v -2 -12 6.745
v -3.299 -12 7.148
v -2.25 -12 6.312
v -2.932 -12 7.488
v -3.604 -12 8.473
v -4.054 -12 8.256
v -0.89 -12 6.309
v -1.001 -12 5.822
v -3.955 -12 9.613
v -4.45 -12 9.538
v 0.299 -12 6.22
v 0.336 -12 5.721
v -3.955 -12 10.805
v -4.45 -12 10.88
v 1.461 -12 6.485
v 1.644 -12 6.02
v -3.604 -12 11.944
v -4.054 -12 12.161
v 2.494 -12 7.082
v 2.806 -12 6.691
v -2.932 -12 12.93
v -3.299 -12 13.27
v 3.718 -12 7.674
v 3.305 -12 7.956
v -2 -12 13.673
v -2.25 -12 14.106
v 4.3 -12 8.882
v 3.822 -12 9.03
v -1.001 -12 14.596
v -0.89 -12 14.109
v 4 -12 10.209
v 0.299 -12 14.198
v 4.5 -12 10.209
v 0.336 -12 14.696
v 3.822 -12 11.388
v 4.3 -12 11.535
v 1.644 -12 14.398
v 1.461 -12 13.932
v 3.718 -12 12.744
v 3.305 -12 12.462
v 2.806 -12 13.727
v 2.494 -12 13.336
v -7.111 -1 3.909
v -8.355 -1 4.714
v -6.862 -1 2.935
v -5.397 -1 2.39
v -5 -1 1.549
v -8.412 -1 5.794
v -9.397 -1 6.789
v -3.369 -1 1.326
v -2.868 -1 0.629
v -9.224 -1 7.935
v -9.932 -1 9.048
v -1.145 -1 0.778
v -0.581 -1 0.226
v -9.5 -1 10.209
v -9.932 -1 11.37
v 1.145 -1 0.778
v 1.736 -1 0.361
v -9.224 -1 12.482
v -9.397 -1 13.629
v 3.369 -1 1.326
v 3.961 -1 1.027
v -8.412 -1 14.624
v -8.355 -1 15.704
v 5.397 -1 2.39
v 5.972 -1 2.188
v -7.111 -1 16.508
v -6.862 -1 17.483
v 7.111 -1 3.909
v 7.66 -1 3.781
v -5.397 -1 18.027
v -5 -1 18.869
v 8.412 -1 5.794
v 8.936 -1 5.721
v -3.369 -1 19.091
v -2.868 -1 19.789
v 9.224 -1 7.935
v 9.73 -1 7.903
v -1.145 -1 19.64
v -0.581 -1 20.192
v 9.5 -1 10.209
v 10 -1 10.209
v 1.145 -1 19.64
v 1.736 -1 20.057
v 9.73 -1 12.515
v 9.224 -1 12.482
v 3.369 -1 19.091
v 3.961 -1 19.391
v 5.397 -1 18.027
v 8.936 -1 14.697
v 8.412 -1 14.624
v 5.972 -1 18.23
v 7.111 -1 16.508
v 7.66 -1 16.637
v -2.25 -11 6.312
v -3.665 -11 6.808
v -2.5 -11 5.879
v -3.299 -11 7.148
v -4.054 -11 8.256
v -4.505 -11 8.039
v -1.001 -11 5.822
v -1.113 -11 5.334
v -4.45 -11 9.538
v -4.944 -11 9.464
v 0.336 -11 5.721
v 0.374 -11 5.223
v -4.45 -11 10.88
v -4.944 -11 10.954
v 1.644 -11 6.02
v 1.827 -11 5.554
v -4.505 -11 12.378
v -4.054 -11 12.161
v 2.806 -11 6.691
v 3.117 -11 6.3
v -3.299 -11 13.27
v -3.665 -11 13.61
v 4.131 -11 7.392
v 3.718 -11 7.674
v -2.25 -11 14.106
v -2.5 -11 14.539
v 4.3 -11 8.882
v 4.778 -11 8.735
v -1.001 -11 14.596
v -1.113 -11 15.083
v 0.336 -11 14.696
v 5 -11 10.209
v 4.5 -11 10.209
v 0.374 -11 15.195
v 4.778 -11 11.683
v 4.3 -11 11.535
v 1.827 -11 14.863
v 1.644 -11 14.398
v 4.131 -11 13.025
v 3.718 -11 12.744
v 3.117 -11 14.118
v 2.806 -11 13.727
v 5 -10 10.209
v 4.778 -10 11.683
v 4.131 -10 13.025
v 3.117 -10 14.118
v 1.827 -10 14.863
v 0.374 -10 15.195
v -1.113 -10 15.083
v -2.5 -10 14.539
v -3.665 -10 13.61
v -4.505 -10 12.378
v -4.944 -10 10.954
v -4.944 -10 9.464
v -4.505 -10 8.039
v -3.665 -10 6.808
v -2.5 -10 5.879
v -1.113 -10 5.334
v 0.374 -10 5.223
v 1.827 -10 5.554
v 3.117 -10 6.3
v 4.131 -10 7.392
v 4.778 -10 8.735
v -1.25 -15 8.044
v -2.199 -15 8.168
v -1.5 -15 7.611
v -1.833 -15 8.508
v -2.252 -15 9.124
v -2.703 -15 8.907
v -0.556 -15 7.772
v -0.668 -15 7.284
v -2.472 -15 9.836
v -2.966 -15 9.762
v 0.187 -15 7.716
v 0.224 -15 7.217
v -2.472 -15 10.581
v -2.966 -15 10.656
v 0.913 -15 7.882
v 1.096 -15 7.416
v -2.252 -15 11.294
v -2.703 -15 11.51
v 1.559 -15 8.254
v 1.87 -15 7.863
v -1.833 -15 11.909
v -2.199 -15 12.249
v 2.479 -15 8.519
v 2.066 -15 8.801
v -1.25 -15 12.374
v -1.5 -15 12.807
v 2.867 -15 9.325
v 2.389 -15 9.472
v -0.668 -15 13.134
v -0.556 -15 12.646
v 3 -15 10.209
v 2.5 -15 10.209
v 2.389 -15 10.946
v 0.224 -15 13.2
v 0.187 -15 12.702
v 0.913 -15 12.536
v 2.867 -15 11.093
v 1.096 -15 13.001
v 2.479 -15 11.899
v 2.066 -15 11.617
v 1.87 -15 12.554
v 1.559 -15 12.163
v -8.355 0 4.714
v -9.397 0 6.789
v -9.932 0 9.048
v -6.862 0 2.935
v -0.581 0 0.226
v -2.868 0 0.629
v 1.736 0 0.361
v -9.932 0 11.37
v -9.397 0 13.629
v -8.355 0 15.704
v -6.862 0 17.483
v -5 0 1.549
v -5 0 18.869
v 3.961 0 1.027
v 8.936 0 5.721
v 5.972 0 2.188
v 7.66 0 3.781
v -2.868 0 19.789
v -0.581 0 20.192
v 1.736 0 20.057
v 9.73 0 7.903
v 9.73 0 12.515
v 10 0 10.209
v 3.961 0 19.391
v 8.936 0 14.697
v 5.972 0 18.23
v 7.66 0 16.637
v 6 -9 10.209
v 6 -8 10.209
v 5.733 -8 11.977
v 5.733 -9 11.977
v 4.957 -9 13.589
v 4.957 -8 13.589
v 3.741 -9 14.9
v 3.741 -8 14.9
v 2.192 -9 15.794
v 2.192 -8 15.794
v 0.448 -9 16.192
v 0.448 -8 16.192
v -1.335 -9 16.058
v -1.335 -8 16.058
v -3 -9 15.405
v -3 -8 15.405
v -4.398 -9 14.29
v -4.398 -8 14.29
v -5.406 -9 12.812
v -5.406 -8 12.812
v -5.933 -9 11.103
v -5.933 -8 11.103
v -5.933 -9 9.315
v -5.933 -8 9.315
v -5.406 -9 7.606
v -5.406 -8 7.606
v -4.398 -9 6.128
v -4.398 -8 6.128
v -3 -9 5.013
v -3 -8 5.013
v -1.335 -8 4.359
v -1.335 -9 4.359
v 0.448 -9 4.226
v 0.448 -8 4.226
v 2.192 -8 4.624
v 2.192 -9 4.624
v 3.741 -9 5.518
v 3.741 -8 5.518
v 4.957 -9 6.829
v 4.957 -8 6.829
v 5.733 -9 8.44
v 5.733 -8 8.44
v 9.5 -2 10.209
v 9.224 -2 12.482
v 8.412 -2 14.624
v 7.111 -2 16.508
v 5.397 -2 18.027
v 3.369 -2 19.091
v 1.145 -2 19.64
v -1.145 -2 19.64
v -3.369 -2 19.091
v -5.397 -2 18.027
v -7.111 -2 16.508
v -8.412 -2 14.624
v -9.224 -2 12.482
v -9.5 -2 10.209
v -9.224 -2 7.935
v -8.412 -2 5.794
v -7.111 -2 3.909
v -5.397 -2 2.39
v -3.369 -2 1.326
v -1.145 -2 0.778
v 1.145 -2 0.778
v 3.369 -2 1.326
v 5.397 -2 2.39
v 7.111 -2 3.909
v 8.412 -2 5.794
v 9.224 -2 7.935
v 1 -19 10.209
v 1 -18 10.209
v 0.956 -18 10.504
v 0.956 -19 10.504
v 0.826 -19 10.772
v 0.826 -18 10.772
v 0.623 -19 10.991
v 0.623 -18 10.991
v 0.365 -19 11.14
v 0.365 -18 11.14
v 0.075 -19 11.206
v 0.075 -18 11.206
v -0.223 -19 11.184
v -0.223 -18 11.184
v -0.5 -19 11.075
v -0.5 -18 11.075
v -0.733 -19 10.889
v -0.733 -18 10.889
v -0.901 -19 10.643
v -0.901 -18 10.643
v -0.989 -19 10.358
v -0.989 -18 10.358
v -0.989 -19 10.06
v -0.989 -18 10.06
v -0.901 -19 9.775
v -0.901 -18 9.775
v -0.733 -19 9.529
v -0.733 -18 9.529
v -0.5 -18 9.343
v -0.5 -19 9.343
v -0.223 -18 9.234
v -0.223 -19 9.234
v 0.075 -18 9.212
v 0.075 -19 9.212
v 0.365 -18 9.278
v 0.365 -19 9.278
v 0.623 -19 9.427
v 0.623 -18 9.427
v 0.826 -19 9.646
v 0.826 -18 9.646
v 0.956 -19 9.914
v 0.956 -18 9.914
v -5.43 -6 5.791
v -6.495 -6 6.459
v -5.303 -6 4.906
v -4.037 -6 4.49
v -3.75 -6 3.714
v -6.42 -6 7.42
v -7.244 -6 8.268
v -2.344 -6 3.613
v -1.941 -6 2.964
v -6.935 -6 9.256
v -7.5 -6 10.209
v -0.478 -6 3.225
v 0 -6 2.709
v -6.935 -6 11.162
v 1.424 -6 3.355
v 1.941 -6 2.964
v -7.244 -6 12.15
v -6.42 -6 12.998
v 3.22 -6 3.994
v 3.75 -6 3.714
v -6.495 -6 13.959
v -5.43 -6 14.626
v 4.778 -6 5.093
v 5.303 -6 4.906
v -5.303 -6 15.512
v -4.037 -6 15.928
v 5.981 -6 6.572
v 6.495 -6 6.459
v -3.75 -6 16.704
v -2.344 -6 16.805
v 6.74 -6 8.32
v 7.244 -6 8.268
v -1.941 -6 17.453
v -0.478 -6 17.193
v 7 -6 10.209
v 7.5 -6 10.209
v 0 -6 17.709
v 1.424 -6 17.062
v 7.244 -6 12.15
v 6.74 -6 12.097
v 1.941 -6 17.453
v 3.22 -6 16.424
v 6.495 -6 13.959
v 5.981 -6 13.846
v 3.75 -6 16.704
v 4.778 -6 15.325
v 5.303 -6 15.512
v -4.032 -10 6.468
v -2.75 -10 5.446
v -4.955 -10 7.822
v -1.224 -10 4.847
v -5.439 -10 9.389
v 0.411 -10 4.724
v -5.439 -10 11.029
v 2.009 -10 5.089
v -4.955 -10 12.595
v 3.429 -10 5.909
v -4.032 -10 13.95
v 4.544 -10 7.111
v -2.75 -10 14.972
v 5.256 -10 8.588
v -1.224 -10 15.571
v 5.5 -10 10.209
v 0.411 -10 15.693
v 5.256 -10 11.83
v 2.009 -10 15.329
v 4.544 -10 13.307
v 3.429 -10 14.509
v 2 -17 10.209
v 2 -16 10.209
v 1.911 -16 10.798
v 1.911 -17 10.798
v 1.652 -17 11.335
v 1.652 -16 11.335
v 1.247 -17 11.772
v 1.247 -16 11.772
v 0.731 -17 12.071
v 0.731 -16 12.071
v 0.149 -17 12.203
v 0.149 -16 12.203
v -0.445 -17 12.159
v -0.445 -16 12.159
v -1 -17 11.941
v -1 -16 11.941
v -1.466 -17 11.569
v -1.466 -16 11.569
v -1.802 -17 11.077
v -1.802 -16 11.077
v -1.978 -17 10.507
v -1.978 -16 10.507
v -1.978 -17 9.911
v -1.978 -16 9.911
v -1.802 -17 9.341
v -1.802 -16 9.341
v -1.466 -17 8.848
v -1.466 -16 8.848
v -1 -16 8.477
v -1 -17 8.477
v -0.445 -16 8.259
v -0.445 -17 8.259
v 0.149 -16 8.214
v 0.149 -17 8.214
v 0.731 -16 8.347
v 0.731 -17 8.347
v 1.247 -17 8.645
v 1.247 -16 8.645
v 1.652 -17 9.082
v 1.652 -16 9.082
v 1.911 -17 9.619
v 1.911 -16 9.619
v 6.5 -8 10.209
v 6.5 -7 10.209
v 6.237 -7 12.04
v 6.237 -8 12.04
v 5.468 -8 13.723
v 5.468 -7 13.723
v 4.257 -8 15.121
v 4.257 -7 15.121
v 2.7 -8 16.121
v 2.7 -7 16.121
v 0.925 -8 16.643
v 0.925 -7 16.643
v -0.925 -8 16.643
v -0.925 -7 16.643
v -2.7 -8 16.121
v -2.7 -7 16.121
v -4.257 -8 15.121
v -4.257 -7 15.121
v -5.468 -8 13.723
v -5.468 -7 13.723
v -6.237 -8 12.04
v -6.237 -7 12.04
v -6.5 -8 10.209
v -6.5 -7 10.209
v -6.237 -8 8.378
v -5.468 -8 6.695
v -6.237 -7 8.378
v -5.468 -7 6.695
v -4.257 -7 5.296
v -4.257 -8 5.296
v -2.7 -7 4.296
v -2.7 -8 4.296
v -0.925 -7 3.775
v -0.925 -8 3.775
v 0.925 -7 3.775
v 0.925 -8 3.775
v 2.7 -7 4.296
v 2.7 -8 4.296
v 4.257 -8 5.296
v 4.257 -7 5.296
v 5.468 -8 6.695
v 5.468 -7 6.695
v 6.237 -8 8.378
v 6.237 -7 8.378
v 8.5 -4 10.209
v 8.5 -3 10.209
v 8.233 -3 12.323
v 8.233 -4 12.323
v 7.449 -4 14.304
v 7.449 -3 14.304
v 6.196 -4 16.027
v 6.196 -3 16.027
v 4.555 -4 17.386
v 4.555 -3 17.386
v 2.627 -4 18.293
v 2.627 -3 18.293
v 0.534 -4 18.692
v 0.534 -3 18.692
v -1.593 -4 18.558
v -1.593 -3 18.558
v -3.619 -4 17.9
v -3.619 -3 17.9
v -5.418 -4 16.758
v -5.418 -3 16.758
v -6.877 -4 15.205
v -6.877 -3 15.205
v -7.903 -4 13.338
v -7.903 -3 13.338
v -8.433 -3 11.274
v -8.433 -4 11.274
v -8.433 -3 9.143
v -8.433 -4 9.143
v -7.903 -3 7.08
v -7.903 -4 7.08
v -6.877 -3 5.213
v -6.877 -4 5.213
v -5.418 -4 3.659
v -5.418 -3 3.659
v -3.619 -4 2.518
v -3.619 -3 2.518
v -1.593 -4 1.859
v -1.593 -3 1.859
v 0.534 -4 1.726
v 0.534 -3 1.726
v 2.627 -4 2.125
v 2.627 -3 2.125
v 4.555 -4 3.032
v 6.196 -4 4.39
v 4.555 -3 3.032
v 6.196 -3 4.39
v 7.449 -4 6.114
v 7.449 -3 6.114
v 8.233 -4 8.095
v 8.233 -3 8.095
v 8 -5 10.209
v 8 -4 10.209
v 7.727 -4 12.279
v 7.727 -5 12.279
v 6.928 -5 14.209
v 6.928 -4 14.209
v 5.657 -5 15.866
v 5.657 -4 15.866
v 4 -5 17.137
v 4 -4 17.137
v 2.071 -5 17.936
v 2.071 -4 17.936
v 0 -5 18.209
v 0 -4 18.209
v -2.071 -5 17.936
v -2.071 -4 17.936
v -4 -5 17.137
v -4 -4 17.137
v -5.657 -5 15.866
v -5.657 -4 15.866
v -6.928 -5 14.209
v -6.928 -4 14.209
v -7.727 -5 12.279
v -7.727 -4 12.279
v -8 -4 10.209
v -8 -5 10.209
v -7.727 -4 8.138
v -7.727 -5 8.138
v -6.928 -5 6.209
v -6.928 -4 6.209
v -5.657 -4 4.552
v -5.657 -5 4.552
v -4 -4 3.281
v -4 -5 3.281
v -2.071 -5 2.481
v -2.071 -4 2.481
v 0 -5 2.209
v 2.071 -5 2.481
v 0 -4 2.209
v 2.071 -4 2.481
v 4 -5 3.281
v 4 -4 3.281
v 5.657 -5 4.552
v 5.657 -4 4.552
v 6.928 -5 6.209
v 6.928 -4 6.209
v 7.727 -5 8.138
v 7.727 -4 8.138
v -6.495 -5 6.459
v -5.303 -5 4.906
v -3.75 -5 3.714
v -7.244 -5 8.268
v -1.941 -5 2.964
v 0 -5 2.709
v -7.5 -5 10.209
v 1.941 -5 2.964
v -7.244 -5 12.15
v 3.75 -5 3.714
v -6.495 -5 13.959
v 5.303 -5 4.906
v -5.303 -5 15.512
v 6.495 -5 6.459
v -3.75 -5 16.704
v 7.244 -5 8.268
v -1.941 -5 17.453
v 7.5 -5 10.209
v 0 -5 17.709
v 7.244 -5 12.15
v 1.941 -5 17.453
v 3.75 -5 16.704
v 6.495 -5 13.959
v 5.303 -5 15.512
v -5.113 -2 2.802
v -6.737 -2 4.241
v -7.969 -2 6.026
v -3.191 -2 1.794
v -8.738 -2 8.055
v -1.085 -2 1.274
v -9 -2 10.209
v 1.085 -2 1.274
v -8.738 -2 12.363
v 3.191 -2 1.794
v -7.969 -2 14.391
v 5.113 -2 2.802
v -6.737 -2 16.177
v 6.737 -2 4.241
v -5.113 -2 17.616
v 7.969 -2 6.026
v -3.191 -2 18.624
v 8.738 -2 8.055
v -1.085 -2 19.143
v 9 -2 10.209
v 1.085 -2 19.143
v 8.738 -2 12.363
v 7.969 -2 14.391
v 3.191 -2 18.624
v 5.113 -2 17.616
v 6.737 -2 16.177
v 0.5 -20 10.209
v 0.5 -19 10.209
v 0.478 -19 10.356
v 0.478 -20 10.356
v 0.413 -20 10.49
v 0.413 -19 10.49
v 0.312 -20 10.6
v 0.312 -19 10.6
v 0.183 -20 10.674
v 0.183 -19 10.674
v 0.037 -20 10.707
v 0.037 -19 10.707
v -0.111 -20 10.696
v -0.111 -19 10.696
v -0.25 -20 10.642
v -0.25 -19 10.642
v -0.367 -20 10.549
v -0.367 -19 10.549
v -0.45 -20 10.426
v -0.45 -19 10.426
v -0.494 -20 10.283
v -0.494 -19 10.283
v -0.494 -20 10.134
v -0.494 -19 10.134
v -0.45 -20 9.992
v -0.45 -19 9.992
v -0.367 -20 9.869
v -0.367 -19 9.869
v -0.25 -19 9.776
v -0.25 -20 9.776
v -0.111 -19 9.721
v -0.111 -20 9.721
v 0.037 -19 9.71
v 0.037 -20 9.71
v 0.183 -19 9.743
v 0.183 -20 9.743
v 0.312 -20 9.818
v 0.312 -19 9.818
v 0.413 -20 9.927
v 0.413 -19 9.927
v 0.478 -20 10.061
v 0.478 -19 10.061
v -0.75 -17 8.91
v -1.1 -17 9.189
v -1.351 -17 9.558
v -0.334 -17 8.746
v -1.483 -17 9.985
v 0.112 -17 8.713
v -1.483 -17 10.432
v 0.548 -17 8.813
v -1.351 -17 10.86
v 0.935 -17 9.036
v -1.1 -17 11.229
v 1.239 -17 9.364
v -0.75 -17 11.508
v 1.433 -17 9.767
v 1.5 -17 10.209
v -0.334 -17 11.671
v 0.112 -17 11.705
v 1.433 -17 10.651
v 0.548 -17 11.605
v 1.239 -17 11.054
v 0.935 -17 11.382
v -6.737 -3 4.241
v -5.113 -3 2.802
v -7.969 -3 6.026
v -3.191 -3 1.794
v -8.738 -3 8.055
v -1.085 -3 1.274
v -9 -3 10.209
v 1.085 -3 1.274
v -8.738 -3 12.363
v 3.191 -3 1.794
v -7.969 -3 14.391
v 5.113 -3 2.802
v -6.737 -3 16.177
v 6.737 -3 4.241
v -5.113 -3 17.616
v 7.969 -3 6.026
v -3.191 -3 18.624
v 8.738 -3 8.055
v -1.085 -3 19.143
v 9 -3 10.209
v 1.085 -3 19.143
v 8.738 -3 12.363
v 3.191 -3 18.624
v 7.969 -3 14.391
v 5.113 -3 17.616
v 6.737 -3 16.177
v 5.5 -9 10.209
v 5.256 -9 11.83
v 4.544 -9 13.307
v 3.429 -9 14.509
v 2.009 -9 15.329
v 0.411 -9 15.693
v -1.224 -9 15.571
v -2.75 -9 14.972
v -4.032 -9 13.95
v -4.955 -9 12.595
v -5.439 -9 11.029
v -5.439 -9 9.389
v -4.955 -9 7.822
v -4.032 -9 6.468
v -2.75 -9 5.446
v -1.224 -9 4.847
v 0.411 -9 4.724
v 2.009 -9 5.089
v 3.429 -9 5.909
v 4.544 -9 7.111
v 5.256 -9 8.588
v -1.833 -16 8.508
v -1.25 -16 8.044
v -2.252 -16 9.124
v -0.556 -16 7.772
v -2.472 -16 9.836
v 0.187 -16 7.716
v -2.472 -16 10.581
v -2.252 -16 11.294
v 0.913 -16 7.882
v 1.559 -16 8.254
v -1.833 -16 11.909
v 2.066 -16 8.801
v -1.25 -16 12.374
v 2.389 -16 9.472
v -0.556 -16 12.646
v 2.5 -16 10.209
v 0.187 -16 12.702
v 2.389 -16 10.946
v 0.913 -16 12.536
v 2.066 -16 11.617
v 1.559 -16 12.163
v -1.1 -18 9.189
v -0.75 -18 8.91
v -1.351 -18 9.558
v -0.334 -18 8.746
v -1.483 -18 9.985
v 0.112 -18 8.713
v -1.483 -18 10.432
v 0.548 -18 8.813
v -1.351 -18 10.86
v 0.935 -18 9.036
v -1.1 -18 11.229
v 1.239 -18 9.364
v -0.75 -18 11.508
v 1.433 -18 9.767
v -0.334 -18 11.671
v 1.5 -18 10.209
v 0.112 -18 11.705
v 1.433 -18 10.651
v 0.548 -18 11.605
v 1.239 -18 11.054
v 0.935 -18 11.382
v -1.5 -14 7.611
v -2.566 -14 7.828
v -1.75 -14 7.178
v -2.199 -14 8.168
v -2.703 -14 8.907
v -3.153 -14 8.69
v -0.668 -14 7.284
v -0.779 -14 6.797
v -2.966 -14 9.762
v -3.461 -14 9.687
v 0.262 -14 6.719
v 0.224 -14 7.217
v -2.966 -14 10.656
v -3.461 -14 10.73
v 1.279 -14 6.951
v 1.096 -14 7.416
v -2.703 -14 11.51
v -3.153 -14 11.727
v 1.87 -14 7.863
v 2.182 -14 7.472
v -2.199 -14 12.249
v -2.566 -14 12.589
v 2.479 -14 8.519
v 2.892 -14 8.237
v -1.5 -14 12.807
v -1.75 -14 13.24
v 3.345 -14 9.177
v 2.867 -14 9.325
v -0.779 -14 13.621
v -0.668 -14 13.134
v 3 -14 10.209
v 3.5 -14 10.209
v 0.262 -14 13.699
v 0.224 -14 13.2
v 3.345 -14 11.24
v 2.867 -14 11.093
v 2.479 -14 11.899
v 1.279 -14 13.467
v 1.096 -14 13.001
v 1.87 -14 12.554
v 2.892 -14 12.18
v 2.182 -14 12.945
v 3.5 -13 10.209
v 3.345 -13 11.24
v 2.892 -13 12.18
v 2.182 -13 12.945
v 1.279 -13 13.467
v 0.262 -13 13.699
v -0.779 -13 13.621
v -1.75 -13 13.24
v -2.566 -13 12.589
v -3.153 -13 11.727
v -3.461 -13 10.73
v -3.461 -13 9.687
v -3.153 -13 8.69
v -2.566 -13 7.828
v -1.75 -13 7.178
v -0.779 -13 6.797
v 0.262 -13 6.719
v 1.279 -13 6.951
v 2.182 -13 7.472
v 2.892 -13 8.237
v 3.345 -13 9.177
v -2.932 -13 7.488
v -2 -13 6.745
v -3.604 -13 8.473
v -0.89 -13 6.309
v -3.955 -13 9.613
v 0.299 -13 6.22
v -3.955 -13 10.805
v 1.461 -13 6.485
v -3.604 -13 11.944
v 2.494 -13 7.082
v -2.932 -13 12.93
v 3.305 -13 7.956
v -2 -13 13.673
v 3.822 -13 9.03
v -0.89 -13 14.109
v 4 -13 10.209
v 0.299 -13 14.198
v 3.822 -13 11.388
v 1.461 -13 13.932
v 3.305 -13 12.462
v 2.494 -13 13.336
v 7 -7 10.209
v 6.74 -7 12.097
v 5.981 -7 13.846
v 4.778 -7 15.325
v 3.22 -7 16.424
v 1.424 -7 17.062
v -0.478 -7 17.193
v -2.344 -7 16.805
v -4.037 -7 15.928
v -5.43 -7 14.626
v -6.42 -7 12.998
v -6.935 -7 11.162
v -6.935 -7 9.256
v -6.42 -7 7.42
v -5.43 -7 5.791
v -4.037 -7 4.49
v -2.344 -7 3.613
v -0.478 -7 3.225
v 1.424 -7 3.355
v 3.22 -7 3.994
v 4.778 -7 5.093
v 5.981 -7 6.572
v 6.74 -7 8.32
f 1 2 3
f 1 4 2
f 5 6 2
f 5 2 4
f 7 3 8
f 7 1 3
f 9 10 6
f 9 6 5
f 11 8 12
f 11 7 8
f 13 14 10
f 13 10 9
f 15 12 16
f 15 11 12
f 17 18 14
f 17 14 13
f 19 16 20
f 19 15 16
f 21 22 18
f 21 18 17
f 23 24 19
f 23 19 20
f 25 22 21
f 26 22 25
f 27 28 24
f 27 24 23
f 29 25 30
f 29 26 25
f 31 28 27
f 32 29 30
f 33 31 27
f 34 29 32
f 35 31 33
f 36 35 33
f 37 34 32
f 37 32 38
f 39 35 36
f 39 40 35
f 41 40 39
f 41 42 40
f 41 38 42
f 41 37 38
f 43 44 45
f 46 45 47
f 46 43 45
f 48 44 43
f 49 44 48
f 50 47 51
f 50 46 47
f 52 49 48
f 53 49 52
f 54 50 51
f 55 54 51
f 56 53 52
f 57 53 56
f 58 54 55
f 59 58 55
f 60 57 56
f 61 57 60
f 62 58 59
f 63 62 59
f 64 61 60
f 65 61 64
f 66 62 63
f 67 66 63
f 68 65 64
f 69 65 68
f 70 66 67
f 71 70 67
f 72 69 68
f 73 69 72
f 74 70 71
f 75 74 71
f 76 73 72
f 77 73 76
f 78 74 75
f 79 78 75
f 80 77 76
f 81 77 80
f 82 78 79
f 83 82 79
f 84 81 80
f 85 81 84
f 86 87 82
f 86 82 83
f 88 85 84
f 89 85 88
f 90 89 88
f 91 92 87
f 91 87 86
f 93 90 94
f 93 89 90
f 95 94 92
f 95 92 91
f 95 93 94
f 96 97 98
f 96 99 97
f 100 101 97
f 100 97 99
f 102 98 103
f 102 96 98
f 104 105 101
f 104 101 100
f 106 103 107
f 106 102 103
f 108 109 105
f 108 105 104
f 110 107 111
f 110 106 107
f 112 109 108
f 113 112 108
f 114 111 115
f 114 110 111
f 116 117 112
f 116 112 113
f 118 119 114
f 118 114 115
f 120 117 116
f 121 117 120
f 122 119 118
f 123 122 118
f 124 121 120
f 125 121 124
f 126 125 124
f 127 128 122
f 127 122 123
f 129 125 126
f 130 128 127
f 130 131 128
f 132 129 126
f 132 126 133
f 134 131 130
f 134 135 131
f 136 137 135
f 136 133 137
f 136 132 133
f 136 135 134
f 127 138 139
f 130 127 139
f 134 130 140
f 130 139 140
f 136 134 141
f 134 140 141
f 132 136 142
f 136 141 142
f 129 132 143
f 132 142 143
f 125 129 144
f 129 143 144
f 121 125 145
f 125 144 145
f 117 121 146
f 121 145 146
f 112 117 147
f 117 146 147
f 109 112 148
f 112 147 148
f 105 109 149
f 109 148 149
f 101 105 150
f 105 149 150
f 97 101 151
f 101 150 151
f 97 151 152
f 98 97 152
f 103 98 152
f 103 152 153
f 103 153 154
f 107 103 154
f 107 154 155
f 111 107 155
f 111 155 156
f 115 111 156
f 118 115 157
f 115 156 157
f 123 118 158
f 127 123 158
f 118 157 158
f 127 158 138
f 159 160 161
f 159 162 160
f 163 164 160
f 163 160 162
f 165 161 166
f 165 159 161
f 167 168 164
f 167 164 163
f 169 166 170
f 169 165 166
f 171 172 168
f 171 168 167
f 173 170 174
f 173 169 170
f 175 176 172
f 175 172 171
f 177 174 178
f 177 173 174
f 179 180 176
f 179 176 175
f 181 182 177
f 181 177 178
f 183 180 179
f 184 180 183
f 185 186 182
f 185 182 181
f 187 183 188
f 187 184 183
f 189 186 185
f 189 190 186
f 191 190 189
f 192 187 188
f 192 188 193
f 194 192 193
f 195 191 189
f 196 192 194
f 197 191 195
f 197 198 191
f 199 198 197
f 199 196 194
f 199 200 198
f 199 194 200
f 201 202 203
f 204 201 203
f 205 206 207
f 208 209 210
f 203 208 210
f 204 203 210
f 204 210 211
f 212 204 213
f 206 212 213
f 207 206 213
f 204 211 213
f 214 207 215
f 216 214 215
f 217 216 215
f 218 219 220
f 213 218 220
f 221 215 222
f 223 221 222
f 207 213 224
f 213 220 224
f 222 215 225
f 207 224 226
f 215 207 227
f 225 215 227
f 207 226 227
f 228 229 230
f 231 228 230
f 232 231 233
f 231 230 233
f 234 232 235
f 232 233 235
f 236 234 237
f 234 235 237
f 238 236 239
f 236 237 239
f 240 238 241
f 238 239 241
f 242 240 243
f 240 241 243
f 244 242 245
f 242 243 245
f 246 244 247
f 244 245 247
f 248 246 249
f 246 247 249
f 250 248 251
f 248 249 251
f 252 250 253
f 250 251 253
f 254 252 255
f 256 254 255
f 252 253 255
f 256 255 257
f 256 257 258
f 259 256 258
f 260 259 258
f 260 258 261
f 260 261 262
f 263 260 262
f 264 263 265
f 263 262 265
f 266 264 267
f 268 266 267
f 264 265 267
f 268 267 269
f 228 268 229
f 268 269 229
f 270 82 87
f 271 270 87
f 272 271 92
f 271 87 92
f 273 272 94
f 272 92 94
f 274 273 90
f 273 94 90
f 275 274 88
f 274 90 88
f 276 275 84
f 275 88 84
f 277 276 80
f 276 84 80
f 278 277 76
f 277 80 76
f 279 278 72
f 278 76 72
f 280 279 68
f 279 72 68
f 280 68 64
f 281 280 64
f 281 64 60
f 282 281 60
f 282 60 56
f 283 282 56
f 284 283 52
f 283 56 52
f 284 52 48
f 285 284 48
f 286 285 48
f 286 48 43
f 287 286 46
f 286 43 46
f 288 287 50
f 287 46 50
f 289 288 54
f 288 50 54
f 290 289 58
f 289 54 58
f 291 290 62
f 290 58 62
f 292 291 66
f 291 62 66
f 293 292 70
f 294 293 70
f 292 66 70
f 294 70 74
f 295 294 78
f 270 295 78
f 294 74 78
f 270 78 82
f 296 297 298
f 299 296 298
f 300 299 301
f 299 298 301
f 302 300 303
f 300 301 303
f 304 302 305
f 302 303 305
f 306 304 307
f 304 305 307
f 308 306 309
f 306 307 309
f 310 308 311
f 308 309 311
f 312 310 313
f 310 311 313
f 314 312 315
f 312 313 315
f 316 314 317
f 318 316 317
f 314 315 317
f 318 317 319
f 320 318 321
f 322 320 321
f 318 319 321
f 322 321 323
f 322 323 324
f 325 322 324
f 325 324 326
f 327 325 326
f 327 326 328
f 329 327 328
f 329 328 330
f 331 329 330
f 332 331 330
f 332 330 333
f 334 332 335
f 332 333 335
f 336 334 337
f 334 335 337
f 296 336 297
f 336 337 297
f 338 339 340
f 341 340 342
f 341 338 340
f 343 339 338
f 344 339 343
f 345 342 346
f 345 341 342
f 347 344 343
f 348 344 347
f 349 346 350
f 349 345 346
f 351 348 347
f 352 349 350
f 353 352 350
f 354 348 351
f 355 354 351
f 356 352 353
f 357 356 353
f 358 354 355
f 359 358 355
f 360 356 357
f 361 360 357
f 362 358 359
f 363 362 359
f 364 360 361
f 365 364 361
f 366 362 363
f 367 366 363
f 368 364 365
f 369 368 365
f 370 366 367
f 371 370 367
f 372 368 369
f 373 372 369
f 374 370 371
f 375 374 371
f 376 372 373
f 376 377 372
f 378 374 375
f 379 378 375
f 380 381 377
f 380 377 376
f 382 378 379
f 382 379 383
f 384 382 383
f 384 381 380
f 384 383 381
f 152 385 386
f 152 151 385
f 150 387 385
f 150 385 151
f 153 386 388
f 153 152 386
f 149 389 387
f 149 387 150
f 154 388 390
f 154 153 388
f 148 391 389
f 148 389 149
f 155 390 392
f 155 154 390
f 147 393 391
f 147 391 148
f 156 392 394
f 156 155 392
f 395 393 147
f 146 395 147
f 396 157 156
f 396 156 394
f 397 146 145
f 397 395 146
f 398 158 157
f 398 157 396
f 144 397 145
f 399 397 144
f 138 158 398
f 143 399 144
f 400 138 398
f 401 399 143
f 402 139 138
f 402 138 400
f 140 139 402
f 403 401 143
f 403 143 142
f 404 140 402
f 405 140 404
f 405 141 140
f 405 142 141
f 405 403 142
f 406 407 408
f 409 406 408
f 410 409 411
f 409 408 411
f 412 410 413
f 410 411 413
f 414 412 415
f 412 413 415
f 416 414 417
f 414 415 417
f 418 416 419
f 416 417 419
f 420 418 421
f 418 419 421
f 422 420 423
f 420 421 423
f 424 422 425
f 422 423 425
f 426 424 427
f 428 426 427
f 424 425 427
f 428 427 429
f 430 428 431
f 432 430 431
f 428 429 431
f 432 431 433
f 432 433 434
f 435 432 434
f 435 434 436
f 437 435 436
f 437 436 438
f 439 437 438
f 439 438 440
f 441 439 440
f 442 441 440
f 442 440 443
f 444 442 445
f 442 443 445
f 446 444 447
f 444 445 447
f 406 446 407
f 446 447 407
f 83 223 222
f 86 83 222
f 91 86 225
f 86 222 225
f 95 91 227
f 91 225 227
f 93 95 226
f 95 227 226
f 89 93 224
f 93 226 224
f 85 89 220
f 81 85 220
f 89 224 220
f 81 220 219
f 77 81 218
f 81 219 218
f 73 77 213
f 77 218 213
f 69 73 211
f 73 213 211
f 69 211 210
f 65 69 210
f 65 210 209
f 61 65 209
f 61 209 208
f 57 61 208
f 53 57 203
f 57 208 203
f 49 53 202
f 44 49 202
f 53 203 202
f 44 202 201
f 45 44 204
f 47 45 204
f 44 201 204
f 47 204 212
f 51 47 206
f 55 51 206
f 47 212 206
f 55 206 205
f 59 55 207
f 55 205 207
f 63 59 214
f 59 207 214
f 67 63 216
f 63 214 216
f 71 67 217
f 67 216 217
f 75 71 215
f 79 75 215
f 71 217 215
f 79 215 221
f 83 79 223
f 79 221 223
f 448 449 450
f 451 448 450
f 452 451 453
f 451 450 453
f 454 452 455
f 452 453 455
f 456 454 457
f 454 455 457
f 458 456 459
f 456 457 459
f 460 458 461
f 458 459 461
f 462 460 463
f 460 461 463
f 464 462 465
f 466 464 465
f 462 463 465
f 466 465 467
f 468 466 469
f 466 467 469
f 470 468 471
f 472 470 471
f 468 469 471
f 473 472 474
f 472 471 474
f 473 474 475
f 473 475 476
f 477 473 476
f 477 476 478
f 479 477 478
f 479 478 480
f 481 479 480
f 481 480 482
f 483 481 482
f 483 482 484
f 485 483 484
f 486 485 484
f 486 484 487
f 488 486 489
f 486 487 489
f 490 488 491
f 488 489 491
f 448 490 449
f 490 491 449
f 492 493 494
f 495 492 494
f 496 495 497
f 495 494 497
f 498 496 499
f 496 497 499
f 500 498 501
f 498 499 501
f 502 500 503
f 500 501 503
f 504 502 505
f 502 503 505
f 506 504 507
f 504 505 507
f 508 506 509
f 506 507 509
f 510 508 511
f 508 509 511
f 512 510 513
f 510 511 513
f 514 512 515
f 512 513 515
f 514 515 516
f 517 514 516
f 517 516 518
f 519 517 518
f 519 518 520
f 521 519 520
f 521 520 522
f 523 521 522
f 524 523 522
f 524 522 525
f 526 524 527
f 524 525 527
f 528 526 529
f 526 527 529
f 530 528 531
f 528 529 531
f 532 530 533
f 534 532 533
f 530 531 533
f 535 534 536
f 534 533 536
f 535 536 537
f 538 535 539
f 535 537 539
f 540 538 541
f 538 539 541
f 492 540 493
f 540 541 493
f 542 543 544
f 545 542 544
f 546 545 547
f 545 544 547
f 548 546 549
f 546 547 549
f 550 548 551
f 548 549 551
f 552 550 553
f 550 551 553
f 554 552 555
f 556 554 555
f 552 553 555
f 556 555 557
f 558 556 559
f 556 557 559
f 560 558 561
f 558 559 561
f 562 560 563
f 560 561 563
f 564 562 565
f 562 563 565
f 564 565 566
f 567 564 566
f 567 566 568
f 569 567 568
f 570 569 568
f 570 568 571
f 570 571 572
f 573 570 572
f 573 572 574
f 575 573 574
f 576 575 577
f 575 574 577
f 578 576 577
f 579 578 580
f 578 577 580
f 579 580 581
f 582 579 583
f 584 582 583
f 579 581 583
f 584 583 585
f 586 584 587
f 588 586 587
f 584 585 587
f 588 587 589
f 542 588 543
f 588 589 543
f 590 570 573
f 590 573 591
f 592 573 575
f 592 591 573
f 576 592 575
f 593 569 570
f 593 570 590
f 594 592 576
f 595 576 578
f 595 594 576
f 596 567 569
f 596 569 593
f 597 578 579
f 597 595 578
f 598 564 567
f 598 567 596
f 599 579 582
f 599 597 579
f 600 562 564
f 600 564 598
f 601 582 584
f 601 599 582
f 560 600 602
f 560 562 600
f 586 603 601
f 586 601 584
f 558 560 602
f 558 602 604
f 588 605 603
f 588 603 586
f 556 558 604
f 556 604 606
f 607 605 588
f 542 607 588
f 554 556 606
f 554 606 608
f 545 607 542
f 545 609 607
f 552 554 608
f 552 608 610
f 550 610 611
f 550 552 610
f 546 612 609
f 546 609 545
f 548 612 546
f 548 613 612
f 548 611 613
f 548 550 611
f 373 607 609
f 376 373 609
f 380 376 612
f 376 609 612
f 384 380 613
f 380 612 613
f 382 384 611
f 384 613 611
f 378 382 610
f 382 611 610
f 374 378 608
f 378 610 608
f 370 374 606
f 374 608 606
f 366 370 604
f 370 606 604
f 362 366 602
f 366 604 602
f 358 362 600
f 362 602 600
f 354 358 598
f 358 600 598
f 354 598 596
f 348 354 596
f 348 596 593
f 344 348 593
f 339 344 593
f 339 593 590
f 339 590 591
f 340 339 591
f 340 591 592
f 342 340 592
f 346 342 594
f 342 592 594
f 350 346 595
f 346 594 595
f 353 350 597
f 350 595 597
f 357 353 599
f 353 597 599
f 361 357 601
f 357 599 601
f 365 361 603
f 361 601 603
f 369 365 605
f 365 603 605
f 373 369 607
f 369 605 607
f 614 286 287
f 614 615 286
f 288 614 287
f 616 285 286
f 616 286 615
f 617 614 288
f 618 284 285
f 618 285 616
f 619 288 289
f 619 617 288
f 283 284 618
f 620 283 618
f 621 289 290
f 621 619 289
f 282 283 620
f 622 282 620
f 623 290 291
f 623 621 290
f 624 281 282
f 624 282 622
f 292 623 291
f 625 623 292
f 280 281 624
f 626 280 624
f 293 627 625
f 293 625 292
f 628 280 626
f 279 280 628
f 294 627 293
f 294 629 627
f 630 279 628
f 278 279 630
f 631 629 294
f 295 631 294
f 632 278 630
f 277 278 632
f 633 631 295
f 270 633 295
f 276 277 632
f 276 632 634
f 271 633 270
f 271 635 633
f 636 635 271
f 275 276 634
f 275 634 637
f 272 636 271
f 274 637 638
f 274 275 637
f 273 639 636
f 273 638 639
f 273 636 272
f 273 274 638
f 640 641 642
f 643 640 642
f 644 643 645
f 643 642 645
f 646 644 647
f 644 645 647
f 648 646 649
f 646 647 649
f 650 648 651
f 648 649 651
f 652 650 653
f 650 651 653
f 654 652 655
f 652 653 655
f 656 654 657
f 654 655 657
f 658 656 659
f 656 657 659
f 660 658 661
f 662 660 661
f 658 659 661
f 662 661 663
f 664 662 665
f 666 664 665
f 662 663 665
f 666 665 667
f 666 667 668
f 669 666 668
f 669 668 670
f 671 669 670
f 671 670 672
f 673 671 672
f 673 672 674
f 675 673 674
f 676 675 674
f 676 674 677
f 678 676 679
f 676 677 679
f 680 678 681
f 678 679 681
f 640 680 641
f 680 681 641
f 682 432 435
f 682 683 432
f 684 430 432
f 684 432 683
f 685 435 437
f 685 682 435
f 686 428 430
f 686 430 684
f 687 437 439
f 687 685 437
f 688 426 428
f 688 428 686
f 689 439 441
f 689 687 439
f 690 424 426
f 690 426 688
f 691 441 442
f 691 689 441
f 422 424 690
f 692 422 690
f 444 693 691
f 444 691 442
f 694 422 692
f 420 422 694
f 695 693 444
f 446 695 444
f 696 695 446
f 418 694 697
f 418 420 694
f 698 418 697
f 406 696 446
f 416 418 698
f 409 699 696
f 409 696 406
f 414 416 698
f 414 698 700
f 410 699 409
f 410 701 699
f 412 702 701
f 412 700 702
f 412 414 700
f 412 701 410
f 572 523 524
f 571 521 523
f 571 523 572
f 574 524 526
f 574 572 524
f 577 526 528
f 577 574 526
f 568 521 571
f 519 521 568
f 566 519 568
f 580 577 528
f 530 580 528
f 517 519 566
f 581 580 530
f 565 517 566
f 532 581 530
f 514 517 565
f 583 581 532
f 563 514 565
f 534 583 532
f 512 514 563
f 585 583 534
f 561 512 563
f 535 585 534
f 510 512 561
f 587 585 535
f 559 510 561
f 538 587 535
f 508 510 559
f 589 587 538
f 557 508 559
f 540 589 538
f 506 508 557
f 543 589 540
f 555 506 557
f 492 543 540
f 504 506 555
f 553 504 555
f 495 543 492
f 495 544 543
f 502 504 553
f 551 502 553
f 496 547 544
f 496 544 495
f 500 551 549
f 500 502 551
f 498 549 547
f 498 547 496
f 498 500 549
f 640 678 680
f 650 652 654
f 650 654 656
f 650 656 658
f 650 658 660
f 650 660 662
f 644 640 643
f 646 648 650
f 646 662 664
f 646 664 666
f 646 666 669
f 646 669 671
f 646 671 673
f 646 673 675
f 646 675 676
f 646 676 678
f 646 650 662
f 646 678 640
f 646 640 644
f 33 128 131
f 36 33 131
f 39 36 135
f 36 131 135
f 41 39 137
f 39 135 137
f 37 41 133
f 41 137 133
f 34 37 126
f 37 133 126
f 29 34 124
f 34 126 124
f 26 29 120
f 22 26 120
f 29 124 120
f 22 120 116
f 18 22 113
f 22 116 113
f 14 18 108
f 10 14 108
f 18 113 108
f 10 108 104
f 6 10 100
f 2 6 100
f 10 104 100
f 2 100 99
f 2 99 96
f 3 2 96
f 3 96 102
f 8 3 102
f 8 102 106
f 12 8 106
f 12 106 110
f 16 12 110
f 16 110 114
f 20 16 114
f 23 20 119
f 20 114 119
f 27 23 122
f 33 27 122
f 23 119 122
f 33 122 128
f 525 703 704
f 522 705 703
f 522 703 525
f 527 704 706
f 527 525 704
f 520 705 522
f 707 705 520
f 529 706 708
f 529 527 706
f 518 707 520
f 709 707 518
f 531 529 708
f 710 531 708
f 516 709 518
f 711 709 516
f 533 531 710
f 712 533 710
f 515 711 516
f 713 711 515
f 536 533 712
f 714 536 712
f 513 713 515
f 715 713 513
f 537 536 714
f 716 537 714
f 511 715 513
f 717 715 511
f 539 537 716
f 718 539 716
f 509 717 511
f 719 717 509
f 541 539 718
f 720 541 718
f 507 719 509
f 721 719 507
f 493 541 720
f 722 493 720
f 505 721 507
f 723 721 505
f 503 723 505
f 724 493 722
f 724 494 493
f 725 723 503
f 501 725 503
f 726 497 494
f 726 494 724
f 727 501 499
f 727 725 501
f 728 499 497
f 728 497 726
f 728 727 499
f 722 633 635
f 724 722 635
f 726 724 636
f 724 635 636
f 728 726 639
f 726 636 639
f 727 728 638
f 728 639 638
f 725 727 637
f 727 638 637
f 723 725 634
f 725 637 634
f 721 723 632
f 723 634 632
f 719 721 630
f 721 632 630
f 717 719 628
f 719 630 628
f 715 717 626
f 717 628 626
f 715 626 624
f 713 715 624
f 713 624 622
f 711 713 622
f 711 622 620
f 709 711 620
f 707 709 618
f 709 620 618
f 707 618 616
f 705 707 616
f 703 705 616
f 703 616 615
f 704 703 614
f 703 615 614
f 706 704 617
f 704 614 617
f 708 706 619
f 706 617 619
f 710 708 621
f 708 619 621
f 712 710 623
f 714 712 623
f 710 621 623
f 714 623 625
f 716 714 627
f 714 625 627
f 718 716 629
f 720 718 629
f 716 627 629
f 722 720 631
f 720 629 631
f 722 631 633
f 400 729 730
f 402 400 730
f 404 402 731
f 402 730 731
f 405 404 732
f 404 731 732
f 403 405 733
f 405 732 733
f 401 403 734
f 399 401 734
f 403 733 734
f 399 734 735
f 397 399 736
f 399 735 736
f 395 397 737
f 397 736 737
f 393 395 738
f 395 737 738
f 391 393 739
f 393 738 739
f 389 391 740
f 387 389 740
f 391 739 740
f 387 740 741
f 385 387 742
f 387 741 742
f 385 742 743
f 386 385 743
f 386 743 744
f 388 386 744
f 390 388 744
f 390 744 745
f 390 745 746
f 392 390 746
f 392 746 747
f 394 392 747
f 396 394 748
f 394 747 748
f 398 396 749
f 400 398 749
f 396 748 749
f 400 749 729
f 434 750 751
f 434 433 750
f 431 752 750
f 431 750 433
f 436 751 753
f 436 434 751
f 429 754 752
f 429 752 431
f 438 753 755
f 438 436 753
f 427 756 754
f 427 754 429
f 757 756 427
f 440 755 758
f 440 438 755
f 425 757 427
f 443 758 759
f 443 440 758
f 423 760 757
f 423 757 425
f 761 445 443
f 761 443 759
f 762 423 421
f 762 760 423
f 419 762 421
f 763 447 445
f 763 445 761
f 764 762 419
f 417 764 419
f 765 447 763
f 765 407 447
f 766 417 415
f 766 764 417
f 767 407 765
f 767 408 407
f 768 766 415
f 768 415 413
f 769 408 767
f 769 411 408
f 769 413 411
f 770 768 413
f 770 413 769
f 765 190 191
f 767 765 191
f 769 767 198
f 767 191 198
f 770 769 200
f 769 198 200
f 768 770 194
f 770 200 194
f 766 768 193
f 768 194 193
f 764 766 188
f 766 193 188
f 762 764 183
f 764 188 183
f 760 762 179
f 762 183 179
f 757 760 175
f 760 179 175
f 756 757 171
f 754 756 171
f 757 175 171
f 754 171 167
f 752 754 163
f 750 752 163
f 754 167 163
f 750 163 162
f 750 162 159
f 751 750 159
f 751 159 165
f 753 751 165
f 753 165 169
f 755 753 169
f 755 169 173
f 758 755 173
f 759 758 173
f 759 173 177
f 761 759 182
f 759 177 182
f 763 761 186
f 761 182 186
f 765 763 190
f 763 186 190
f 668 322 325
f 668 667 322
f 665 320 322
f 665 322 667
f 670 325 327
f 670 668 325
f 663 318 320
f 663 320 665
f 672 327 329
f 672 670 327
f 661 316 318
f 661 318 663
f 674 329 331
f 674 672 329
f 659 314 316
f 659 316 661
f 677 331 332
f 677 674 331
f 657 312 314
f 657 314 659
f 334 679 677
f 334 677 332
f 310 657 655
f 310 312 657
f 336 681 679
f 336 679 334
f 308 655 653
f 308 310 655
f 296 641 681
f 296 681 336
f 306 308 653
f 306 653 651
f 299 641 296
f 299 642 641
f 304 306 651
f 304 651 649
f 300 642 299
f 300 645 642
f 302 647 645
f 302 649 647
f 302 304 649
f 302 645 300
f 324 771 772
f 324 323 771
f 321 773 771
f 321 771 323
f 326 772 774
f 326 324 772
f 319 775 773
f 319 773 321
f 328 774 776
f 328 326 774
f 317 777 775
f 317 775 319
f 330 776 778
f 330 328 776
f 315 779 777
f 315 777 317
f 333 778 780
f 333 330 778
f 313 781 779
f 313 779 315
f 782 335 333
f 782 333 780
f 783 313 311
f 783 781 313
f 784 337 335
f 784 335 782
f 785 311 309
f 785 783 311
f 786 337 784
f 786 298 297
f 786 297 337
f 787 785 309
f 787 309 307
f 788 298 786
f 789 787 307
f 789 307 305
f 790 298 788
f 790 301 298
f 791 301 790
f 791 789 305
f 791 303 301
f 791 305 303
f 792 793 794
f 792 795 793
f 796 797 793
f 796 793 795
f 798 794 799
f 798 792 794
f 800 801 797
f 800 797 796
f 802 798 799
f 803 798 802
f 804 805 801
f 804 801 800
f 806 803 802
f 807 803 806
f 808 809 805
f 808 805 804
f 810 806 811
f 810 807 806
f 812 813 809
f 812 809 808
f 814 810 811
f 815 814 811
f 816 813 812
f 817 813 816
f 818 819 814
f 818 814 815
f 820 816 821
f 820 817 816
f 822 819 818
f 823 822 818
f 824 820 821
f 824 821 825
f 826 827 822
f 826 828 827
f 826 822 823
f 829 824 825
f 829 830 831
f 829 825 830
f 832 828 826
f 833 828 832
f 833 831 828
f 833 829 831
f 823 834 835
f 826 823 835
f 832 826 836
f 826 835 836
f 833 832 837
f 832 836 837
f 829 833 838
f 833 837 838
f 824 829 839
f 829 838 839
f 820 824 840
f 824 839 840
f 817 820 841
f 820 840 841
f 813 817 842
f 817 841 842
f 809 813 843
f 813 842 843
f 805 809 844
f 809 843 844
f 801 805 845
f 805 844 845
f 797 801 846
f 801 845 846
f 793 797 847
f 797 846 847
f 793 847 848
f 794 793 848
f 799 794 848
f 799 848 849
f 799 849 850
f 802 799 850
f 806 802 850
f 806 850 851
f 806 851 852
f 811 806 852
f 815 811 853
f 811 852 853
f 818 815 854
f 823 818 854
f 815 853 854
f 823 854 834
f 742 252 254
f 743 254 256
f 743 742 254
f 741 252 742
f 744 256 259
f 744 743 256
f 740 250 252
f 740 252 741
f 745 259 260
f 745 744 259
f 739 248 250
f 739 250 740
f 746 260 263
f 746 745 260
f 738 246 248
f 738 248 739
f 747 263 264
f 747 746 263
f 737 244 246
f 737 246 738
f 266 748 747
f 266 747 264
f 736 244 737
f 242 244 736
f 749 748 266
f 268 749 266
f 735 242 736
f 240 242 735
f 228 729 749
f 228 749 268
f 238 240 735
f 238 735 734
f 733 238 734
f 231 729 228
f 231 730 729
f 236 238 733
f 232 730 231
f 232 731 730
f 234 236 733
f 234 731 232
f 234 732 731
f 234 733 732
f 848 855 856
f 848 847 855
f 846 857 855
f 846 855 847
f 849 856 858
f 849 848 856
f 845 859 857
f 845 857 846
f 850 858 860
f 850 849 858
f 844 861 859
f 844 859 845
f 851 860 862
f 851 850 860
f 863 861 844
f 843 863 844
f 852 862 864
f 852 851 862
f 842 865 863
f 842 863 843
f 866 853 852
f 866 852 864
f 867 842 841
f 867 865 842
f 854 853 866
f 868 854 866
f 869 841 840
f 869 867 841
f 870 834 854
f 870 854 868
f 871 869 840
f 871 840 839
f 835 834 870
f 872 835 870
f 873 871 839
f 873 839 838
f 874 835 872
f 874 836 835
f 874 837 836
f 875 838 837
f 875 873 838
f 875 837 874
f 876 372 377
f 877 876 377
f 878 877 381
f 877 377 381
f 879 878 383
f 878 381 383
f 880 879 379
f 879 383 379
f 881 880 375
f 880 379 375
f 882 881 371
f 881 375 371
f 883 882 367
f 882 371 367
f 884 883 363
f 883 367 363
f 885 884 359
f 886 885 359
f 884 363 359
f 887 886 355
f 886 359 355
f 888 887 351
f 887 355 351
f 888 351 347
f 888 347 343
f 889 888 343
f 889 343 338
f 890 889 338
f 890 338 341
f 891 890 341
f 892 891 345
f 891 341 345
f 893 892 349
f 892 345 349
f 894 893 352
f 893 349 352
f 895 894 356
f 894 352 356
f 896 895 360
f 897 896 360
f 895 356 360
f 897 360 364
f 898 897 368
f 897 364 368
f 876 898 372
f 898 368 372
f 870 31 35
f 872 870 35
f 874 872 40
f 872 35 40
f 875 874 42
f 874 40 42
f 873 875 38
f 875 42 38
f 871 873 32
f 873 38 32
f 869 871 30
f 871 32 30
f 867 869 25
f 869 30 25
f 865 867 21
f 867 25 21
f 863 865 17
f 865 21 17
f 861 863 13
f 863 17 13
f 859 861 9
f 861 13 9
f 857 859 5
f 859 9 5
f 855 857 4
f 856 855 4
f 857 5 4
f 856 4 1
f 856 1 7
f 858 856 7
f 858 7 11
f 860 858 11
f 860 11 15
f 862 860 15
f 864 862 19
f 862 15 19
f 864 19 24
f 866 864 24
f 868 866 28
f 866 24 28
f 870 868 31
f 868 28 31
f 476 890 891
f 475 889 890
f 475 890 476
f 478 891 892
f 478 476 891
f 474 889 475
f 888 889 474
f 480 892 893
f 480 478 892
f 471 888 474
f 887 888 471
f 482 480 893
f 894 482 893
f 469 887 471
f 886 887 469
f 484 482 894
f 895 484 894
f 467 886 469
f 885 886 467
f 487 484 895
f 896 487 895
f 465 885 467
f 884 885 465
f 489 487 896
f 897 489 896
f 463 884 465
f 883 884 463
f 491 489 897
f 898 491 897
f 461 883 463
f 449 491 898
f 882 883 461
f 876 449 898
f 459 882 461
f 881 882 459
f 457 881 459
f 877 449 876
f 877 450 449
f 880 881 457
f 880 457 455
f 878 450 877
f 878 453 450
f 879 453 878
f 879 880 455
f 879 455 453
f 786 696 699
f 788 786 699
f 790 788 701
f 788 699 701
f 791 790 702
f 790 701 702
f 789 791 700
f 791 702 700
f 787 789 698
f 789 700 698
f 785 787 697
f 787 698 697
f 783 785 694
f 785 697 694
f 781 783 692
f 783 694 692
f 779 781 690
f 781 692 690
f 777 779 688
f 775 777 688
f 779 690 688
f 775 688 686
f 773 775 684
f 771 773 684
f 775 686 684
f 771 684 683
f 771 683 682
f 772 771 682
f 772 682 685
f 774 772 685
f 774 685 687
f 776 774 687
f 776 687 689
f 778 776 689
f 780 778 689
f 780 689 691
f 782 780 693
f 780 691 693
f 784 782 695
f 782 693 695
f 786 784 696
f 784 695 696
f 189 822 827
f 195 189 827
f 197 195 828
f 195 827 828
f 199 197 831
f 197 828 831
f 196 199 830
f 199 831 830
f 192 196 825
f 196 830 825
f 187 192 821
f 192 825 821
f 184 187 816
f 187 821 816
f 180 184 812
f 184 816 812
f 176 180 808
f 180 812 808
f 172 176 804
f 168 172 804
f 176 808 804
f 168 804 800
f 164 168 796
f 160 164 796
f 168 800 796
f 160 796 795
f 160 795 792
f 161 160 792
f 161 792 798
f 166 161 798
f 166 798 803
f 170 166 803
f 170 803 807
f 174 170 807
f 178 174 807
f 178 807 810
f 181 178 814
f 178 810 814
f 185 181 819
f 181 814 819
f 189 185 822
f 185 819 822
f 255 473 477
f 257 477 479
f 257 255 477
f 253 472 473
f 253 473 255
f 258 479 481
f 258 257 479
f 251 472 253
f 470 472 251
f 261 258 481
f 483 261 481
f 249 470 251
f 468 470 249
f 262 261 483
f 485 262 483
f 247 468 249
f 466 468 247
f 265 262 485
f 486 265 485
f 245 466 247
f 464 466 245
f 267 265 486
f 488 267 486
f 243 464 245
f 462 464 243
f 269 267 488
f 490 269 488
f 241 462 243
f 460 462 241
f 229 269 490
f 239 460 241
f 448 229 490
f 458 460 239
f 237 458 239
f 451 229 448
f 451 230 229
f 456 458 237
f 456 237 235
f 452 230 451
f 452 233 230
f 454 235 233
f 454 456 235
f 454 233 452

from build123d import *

# Parameters (mm, degrees)
F0_R      = 10
F1_DEPTH  = 1
F2_R      = 9.5
F3_DEPTH  = 1
F4_R      = 9
F5_DEPTH  = 1
F6_R      = 8.5
F7_DEPTH  = 1
F8_R      = 8
F9_DEPTH  = 1
F10_R     = 7.5
F11_DEPTH = 1
F12_R     = 7
F13_DEPTH = 1
F14_R     = 6.5
F15_DEPTH = 1
F16_R     = 6
F17_DEPTH = 1
F18_R     = 5.5
F19_DEPTH = 1
F20_R     = 5
F21_DEPTH = 1
F22_R     = 4.5
F23_DEPTH = 1
F24_R     = 4
F25_DEPTH = 1
F26_R     = 3.5
F27_DEPTH = 1
F28_R     = 3
F29_DEPTH = 1
F30_R     = 2.5
F31_DEPTH = 1
F32_R     = 2
F33_DEPTH = 1
F34_R     = 1.5
F35_DEPTH = 1
F36_R     = 1
F37_DEPTH = 1
F38_R     = 0.5
F39_DEPTH = 1


with BuildPart() as f1:
    # F0 (on Front) → F1 (new body)
    with BuildSketch(Plane.XZ):
        with Locations((0, 10.208829)):
            Circle(F0_R)
    extrude(amount=F1_DEPTH)

    # F2 (on face) → F3 (join)
    with BuildSketch(Plane.XZ.offset(1)):
        with Locations((0, 10.208829)):
            Circle(F2_R)
    extrude(amount=F3_DEPTH)

    # F4 (on face) → F5 (join)
    with BuildSketch(Plane.XZ.offset(2)):
        with Locations((0, 10.208829)):
            Circle(F4_R)
    extrude(amount=F5_DEPTH)

    # F6 (on face) → F7 (join)
    with BuildSketch(Plane.XZ.offset(3)):
        with Locations((0, 10.208829)):
            Circle(F6_R)
    extrude(amount=F7_DEPTH)

    # F8 (on face) → F9 (join)
    with BuildSketch(Plane.XZ.offset(4)):
        with Locations((0, 10.208829)):
            Circle(F8_R)
    extrude(amount=F9_DEPTH)

    # F10 (on face) → F11 (join)
    with BuildSketch(Plane.XZ.offset(5)):
        with Locations((0, 10.208829)):
            Circle(F10_R)
    extrude(amount=F11_DEPTH)

    # F12 (on face) → F13 (join)
    with BuildSketch(Plane.XZ.offset(6)):
        with Locations((0, 10.208829)):
            Circle(F12_R)
    extrude(amount=F13_DEPTH)

    # F14 (on face) → F15 (join)
    with BuildSketch(Plane.XZ.offset(7)):
        with Locations((0, 10.208829)):
            Circle(F14_R)
    extrude(amount=F15_DEPTH)

    # F16 (on face) → F17 (join)
    with BuildSketch(Plane.XZ.offset(8)):
        with Locations((0, 10.208829)):
            Circle(F16_R)
    extrude(amount=F17_DEPTH)

    # F18 (on face) → F19 (join)
    with BuildSketch(Plane.XZ.offset(9)):
        with Locations((0, 10.208829)):
            Circle(F18_R)
    extrude(amount=F19_DEPTH)

    # F20 (on face) → F21 (join)
    with BuildSketch(Plane.XZ.offset(10)):
        with Locations((0, 10.208829)):
            Circle(F20_R)
    extrude(amount=F21_DEPTH)

    # F22 (on face) → F23 (join)
    with BuildSketch(Plane.XZ.offset(11)):
        with Locations((0, 10.208829)):
            Circle(F22_R)
    extrude(amount=F23_DEPTH)

    # F24 (on face) → F25 (join)
    with BuildSketch(Plane.XZ.offset(12)):
        with Locations((0, 10.208829)):
            Circle(F24_R)
    extrude(amount=F25_DEPTH)

    # F26 (on face) → F27 (join)
    with BuildSketch(Plane.XZ.offset(13)):
        with Locations((0, 10.208829)):
            Circle(F26_R)
    extrude(amount=F27_DEPTH)

    # F28 (on face) → F29 (join)
    with BuildSketch(Plane.XZ.offset(14)):
        with Locations((0, 10.208829)):
            Circle(F28_R)
    extrude(amount=F29_DEPTH)

    # F30 (on face) → F31 (join)
    with BuildSketch(Plane.XZ.offset(15)):
        with Locations((0, 10.208829)):
            Circle(F30_R)
    extrude(amount=F31_DEPTH)

    # F32 (on face) → F33 (join)
    with BuildSketch(Plane.XZ.offset(16)):
        with Locations((0, 10.208829)):
            Circle(F32_R)
    extrude(amount=F33_DEPTH)

    # F34 (on face) → F35 (join)
    with BuildSketch(Plane.XZ.offset(17)):
        with Locations((0, 10.208829)):
            Circle(F34_R)
    extrude(amount=F35_DEPTH)

    # F36 (on face) → F37 (join)
    with BuildSketch(Plane.XZ.offset(18)):
        with Locations((0, 10.208829)):
            Circle(F36_R)
    extrude(amount=F37_DEPTH)

    # F38 (on face) → F39 (join)
    with BuildSketch(Plane.XZ.offset(19)):
        with Locations((0, 10.208829)):
            Circle(F38_R)
    extrude(amount=F39_DEPTH)


solid = f1.part
